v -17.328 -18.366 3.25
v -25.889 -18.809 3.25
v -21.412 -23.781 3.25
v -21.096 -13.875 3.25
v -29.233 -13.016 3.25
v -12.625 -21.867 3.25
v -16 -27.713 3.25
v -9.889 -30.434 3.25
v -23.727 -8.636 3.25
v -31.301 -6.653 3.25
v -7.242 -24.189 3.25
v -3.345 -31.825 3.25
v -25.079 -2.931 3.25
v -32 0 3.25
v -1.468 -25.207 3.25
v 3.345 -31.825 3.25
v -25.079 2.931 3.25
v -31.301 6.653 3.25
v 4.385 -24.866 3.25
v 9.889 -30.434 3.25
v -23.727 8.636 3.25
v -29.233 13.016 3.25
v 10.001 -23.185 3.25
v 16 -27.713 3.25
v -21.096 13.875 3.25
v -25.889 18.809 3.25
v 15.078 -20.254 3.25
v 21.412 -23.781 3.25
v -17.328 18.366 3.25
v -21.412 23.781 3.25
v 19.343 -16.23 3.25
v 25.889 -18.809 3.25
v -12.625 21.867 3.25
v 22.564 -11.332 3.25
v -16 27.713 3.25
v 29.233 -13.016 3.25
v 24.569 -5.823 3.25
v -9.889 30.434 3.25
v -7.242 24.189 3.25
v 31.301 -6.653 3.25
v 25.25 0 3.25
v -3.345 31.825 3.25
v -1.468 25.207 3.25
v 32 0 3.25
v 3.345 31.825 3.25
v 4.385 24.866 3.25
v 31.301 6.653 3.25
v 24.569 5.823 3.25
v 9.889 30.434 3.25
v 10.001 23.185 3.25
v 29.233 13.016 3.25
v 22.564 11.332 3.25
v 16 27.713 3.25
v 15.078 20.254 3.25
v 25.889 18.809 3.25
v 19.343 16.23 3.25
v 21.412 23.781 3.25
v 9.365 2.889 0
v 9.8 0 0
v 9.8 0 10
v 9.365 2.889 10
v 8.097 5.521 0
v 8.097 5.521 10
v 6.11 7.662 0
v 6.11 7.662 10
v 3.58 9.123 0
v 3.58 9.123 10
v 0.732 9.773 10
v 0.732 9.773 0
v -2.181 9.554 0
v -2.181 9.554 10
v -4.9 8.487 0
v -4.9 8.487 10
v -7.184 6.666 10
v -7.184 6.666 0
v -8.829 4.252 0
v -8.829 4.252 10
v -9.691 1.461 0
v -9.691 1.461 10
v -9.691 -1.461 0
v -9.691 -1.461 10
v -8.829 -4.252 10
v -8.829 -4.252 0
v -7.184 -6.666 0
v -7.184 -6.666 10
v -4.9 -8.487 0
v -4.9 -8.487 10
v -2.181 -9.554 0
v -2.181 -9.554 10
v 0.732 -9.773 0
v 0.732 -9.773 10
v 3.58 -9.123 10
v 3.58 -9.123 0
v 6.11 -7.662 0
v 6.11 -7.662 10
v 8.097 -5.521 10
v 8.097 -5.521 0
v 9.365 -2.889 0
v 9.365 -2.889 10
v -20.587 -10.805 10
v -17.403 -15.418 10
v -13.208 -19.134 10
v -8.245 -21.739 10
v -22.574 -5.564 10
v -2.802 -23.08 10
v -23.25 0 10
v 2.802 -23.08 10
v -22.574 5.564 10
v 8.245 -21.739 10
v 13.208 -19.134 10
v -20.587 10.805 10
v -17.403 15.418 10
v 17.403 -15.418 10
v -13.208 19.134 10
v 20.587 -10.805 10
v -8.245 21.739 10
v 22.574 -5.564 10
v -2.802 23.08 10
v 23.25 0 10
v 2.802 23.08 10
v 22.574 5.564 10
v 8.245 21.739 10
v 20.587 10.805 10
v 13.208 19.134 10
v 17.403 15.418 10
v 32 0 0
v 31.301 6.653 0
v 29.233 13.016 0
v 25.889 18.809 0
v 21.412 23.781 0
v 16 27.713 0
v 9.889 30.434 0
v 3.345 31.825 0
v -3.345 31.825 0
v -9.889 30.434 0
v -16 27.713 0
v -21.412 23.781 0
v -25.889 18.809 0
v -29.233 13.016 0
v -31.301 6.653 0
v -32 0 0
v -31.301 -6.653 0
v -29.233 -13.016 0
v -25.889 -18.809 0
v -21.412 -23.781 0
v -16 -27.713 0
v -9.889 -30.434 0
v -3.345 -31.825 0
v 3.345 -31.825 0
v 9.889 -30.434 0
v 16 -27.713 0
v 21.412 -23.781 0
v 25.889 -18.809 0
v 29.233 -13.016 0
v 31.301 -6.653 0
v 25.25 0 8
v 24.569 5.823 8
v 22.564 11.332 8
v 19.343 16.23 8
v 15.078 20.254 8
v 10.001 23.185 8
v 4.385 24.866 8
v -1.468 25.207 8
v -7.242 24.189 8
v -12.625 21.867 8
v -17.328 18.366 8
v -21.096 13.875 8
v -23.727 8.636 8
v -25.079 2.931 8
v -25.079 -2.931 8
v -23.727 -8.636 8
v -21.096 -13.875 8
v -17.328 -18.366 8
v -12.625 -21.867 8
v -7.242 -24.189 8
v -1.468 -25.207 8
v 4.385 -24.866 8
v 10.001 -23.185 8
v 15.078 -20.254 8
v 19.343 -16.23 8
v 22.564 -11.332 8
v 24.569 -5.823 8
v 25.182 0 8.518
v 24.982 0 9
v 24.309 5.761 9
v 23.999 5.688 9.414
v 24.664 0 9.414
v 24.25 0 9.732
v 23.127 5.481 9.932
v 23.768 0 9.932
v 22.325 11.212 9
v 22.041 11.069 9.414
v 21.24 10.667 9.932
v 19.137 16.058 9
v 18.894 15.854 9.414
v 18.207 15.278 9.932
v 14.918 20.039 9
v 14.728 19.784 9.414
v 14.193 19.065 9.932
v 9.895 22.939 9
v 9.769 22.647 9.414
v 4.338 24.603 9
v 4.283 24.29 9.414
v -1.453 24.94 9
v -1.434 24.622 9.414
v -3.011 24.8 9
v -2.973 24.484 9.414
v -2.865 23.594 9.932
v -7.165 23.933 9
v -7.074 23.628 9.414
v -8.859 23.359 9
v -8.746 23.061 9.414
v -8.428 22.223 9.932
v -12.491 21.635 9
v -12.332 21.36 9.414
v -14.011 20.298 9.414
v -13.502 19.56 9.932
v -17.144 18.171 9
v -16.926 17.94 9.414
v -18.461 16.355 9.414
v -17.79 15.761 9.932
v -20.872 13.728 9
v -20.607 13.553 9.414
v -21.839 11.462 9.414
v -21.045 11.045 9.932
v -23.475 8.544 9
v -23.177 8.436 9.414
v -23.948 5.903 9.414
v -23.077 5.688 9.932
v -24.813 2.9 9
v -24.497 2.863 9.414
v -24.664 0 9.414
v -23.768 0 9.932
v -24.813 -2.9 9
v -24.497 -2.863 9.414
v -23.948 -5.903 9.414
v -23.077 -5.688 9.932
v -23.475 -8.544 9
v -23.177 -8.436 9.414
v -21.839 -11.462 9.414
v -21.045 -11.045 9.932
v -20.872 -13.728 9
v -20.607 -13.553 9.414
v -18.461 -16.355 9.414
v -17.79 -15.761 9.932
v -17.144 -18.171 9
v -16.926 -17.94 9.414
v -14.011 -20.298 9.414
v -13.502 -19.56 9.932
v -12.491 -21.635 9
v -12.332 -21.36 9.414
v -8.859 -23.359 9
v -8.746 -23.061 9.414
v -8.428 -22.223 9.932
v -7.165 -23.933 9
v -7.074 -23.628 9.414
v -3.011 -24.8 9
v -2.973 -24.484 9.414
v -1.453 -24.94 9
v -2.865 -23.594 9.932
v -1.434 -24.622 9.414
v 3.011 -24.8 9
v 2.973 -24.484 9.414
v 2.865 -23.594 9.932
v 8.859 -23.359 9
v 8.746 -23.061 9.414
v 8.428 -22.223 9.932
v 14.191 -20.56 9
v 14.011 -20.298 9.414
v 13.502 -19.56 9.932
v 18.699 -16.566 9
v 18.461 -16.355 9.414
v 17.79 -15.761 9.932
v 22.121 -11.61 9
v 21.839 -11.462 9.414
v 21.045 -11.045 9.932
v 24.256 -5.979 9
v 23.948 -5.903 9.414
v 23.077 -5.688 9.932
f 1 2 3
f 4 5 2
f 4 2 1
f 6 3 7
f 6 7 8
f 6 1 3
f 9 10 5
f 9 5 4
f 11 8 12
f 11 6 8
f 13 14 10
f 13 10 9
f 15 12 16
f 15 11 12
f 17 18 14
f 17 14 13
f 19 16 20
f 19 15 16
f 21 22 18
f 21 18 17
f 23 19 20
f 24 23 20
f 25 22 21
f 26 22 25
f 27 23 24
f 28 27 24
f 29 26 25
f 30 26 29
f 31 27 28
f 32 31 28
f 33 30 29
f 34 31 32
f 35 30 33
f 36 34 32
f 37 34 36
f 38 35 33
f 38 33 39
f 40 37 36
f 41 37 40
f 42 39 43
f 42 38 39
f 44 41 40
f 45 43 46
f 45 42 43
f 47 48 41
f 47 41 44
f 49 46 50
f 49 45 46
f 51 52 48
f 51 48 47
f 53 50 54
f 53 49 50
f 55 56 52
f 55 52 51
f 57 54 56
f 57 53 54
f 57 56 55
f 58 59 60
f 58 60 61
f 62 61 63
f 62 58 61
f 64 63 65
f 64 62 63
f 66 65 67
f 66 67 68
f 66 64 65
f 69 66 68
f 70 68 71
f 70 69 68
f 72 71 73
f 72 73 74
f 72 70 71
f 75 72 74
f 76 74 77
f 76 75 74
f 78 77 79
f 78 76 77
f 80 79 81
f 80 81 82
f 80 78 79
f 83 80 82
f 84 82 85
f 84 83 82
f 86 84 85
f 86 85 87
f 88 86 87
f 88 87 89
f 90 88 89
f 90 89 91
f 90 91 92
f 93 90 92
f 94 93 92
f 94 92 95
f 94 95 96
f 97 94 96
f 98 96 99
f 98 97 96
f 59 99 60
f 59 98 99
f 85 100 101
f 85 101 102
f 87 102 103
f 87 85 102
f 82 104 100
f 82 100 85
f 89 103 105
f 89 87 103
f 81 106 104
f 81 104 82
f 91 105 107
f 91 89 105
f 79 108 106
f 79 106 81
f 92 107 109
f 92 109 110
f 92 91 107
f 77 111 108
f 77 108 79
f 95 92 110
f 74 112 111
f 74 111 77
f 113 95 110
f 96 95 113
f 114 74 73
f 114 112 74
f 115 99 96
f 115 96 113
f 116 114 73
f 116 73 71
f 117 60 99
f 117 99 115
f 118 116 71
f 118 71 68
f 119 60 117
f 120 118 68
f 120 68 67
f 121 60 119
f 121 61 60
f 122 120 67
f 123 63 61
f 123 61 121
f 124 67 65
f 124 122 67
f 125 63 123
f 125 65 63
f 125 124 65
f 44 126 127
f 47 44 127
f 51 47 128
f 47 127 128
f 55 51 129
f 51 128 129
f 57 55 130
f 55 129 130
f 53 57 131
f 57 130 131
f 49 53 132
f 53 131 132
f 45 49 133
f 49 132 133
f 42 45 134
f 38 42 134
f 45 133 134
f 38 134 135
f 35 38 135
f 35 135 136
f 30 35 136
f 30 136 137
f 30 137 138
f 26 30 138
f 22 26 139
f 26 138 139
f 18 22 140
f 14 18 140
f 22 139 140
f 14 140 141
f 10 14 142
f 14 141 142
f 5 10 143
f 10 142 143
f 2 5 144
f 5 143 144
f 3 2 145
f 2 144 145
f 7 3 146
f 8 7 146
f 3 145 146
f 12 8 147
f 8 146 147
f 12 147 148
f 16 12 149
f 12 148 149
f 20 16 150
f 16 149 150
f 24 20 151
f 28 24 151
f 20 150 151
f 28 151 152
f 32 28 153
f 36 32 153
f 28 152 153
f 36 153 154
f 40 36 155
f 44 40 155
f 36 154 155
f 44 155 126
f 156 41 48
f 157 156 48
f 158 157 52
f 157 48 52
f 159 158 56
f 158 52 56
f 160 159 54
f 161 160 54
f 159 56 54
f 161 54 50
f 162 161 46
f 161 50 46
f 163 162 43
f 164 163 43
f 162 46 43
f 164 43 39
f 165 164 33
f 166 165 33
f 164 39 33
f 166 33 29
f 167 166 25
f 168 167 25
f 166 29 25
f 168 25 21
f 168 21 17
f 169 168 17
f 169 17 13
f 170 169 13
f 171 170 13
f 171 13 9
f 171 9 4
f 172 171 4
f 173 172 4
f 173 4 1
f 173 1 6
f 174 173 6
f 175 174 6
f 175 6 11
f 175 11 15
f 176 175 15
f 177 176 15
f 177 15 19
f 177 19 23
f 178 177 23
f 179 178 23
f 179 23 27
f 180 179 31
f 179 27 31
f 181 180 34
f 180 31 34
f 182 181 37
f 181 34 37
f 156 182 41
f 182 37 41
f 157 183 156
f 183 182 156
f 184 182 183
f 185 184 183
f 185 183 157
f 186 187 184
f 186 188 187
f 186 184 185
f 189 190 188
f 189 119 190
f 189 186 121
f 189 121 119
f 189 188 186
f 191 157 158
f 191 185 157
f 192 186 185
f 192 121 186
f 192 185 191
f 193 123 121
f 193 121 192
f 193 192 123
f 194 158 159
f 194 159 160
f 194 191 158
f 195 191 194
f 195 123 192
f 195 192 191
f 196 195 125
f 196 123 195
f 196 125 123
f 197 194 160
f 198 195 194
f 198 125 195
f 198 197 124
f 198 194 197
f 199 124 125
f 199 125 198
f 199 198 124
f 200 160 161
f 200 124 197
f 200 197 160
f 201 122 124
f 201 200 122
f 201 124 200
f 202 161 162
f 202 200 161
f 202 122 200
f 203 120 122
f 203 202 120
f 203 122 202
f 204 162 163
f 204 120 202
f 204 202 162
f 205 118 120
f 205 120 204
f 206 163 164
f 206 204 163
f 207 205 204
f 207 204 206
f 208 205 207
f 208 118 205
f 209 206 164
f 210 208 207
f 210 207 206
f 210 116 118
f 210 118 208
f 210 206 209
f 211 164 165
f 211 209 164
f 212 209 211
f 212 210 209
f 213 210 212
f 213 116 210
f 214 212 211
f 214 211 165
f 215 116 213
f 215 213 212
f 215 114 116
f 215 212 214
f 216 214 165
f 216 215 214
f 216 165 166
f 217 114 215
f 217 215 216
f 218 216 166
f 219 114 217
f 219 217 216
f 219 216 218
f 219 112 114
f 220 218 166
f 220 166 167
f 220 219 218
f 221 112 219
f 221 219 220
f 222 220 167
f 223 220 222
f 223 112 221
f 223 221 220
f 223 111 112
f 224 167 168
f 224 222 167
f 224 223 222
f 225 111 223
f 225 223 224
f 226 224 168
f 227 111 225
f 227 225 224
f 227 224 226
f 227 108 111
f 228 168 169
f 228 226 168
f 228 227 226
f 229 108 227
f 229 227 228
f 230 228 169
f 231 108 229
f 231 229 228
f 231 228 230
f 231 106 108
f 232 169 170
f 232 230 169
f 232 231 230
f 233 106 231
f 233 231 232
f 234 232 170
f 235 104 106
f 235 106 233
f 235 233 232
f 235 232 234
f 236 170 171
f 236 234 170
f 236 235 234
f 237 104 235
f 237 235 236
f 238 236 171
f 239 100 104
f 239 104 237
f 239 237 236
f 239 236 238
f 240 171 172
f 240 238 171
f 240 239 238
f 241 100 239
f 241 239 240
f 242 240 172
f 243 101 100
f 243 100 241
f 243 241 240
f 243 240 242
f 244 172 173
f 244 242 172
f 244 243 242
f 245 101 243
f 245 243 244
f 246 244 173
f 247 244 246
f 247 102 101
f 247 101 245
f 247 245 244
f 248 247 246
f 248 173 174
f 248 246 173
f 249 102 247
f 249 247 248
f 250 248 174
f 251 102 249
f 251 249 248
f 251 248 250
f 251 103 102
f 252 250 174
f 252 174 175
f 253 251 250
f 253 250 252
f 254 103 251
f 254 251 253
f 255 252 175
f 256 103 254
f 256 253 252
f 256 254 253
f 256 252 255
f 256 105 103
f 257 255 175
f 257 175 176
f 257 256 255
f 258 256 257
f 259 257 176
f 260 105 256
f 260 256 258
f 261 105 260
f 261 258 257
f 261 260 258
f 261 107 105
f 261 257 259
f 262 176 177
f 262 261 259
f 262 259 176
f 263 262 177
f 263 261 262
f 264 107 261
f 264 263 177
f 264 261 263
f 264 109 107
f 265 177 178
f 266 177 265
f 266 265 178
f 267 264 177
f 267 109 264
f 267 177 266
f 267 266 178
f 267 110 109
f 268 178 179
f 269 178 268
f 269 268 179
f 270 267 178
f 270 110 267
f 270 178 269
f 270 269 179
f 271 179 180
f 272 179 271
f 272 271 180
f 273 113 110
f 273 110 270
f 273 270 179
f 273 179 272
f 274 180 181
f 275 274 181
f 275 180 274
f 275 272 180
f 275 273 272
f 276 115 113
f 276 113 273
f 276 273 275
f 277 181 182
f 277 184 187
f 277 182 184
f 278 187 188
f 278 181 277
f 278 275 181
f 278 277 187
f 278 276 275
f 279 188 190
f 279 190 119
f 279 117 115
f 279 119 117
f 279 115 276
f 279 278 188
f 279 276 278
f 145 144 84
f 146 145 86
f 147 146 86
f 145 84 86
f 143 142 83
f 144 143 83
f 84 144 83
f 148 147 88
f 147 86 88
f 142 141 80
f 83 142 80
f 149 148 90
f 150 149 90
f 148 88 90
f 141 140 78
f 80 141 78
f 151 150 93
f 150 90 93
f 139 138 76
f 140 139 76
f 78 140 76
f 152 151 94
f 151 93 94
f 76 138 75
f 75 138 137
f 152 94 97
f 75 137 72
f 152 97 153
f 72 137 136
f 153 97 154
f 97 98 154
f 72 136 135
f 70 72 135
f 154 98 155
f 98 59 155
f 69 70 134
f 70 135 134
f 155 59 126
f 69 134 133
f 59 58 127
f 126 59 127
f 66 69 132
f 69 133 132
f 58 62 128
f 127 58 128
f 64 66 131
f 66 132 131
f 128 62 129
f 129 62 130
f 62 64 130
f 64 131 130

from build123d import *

# Parameters (mm, degrees)
F0_R     = 25.25
F0_R_2   = 12
F0_R_3   = 9.8
F1_DEPTH = 10
F0_R_4   = 32
F2_DEPTH = 3.25
F3_R     = 2


# Not quite as in the source:
# - a feature names something its author has since deleted; it is built from what else it names


with BuildPart() as f1:
    # F0 (on Top) → F1 (new body)
    with BuildSketch(Plane.XY):
        Circle(F0_R)
        Circle(F0_R_2, mode=Mode.SUBTRACT)
        Circle(F0_R_2)
        Circle(F0_R_3, mode=Mode.SUBTRACT)
    extrude(amount=F1_DEPTH)

    # F0 (on Top) → F2 (join)
    with BuildSketch(Plane.XY):
        Circle(F0_R_4)
        Circle(F0_R, mode=Mode.SUBTRACT)
    extrude(amount=F2_DEPTH)

    # F3
    f3_edges = [f1.edges().sort_by_distance(p)[0] for p in [
        (-25.25, 0, 10),
    ]]
    fillet(f3_edges, radius=F3_R)


solid = f1.part
